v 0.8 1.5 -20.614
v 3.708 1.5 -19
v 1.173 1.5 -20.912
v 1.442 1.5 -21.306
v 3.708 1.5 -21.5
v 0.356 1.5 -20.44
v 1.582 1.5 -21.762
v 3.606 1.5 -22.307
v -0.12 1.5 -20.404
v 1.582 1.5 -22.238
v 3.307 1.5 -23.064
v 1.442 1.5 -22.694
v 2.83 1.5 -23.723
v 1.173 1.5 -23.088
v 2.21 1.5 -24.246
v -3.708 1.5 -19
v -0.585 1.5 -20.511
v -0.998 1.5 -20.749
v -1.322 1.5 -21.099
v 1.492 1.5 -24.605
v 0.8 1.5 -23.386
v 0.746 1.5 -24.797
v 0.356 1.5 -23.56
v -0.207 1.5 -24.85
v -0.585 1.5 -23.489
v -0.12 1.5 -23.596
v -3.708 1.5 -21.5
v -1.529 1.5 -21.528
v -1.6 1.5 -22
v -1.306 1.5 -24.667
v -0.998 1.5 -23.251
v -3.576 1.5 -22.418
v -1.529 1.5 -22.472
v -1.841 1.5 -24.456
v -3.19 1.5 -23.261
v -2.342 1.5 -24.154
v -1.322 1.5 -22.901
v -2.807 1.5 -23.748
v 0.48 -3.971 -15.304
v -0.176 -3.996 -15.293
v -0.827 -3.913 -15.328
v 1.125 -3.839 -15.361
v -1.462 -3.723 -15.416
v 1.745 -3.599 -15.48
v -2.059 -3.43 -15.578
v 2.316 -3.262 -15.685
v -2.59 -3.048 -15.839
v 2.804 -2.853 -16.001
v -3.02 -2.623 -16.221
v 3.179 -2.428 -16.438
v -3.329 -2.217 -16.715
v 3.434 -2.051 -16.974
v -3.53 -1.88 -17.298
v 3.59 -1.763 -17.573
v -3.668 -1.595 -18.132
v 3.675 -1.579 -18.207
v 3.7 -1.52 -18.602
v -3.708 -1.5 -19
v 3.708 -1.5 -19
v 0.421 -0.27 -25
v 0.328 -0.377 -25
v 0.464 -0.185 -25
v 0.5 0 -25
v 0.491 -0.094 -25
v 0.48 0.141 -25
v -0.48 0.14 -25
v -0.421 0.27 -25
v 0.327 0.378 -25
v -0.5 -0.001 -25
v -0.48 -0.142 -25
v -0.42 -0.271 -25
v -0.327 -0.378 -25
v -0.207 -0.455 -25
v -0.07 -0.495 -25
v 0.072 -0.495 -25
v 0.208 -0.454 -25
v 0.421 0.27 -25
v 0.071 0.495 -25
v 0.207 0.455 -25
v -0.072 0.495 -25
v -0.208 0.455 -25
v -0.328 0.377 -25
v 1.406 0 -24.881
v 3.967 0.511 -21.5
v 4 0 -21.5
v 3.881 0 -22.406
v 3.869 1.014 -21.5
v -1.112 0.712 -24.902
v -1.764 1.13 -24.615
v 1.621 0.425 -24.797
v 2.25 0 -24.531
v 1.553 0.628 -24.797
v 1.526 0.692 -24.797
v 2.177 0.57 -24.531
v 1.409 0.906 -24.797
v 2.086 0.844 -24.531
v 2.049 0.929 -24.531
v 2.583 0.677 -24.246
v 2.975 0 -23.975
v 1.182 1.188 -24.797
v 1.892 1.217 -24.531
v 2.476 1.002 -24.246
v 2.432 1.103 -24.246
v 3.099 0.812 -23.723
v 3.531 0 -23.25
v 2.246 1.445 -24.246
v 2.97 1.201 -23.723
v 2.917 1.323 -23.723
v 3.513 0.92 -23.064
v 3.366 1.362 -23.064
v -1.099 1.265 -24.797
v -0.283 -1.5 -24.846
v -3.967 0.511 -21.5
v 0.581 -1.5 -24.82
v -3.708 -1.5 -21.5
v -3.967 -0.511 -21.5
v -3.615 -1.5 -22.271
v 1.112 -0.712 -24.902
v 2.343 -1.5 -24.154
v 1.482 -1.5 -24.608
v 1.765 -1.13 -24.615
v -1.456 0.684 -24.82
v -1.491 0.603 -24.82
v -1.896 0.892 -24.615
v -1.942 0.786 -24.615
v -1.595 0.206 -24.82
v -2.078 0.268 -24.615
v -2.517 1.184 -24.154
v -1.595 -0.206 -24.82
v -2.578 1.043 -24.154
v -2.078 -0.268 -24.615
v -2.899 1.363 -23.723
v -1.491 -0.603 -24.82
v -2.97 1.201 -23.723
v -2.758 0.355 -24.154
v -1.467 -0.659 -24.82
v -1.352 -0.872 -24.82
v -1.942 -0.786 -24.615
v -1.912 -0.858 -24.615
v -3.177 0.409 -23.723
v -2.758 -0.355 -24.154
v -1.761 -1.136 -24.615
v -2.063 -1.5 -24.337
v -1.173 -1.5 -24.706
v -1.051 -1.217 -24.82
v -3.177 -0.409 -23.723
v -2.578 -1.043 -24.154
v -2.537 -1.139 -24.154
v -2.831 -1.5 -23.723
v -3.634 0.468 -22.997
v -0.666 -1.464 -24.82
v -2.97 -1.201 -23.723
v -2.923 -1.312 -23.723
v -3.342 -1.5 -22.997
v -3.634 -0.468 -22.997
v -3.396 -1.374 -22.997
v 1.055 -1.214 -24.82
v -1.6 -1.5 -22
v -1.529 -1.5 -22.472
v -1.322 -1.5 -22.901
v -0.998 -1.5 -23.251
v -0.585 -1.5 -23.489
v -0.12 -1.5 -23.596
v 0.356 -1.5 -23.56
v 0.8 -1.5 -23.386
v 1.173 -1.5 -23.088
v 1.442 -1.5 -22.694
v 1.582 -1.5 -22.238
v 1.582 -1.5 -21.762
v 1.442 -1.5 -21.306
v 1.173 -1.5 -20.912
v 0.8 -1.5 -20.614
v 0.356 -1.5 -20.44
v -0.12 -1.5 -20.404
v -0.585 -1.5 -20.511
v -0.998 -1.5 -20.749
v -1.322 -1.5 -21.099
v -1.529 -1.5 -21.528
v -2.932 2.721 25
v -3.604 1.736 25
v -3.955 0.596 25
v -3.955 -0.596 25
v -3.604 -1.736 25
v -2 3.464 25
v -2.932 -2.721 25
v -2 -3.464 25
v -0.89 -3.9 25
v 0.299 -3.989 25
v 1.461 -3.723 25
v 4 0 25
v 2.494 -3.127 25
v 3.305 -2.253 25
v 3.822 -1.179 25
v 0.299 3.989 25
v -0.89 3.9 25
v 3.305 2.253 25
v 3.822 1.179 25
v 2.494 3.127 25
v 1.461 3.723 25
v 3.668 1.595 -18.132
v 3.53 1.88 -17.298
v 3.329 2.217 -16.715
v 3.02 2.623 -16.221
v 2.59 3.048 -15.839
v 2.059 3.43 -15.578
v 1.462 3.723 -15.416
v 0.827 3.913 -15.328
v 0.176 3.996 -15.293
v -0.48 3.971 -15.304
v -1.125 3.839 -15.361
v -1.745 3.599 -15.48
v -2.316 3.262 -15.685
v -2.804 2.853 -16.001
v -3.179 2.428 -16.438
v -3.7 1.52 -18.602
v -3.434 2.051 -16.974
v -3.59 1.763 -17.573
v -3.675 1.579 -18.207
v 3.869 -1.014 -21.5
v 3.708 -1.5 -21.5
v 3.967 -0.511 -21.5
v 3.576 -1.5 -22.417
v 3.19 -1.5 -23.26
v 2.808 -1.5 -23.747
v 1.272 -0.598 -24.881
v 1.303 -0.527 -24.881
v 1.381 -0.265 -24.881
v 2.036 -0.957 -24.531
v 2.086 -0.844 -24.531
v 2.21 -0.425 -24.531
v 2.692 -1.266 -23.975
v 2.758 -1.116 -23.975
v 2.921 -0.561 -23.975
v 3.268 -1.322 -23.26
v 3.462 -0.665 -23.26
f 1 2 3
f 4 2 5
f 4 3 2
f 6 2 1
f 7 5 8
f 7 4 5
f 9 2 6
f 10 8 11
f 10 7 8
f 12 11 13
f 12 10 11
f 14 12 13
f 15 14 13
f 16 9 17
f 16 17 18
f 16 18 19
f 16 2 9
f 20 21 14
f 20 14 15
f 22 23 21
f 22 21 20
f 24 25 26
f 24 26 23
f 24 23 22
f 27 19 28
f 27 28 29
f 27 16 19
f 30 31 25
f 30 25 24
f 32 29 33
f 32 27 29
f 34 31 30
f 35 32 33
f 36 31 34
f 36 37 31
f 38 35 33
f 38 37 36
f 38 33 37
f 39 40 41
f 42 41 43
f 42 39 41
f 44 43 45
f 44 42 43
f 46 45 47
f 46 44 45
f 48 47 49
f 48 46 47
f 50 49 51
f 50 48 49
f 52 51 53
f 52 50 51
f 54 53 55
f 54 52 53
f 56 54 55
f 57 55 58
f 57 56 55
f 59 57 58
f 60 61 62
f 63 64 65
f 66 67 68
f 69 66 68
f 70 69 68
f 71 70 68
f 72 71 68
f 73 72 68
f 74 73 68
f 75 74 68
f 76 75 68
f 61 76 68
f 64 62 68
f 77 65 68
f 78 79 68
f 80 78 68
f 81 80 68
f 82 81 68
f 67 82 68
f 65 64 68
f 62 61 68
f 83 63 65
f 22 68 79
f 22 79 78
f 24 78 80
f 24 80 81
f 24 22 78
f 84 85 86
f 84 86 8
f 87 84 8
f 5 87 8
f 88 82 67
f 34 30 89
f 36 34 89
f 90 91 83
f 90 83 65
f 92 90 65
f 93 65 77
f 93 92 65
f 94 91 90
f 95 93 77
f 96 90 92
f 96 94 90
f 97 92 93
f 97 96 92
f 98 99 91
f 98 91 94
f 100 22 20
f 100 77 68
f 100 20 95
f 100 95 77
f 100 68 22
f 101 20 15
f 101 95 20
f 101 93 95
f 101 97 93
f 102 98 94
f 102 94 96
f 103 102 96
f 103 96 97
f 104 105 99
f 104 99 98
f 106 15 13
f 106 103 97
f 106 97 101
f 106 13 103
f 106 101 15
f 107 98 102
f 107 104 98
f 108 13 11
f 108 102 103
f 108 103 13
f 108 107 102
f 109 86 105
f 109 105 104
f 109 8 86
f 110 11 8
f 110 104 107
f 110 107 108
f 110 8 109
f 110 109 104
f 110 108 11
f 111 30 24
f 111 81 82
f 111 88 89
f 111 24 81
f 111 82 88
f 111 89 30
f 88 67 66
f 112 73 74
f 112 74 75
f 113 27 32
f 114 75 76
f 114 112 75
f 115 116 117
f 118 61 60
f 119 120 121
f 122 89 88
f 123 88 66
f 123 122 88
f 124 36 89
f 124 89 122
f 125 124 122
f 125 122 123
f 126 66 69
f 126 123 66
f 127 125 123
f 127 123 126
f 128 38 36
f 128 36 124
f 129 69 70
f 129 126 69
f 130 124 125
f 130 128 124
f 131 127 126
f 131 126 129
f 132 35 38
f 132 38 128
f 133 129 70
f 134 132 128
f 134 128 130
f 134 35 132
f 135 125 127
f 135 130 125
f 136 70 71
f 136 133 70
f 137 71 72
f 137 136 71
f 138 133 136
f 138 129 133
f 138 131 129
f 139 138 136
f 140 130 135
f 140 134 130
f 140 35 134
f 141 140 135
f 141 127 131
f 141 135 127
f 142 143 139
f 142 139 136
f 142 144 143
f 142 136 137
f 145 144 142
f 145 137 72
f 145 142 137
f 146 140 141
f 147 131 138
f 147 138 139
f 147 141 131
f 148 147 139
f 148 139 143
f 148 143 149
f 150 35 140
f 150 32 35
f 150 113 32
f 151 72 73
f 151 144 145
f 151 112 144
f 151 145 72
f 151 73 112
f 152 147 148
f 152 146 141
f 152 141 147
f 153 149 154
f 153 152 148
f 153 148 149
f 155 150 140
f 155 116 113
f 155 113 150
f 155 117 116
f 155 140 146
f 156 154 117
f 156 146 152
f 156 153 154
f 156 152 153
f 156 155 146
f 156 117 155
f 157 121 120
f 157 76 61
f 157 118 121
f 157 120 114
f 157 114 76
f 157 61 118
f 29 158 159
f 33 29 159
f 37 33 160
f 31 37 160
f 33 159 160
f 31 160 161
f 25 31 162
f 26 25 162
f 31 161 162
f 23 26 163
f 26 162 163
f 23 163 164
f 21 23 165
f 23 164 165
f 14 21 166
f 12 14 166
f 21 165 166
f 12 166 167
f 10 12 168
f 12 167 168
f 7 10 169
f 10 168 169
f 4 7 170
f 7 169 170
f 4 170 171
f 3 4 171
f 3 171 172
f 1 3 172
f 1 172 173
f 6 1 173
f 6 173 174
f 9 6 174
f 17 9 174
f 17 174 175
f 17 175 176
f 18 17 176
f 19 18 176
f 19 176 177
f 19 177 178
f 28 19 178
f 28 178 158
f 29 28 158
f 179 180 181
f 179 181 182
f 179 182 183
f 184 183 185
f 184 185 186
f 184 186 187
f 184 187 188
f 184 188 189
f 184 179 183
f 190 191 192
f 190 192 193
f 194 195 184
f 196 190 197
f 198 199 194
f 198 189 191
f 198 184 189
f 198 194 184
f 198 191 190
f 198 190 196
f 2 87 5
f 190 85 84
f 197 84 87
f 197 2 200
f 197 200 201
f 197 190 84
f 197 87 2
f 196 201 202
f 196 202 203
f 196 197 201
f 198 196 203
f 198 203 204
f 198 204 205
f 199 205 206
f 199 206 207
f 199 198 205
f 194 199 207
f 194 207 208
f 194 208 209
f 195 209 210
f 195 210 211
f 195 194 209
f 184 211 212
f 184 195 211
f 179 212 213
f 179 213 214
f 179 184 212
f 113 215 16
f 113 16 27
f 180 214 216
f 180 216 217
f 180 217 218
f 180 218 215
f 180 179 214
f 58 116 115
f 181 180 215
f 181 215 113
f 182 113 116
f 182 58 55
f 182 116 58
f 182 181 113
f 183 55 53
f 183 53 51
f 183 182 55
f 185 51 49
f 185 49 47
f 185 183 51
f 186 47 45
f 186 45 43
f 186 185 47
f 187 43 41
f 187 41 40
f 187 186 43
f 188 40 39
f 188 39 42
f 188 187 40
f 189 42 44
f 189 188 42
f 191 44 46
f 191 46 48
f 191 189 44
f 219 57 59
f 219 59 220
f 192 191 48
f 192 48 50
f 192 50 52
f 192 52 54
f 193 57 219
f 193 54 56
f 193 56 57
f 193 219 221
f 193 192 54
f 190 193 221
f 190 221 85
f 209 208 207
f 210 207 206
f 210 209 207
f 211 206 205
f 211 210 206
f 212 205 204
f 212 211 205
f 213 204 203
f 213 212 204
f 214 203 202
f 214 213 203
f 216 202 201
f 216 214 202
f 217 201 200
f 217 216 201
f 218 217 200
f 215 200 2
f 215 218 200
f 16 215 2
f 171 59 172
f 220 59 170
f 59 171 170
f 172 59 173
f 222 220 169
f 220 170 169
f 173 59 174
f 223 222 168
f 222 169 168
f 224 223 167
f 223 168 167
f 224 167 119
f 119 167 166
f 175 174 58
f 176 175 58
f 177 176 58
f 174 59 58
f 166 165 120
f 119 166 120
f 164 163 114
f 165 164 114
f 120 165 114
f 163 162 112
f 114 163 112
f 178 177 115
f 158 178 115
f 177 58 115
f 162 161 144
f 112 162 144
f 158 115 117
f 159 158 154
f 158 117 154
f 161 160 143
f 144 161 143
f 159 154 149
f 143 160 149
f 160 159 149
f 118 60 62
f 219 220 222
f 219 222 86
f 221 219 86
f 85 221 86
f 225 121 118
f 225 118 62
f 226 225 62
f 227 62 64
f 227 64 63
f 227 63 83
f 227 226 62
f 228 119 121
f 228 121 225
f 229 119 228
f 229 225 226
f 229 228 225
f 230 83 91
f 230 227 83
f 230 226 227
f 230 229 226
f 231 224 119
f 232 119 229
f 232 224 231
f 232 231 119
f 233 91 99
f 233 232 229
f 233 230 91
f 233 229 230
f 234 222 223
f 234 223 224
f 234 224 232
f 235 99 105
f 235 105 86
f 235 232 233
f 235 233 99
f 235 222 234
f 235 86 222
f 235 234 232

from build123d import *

# Parameters (mm, degrees)
SKETCH1_R               = 4
BOSS_EXTRUDE1_DEPTH     = 25
CUT_EXTRUDE1_DEPTH      = 26.632011236
CUT_EXTRUDE1_DEPTH_BACK = 26.632011236
SKETCH2_W               = 10
SKETCH2_H               = 2.5
FILLET1_R               = 4
M3_CLEARANCE_HOLE1_D    = 3.2
FILLET2_R               = 3.5


with BuildPart() as part:
    # Sketch1 → Boss-Extrude1 (new, symmetric)
    with BuildSketch(Plane.XY):
        Circle(SKETCH1_R)
    extrude(amount=BOSS_EXTRUDE1_DEPTH, both=True)

    # Sketch2 → Cut-Extrude1 (cut, two sides: drawn at the far end of the back side and taken through both)
    with BuildSketch(Plane(origin=(0, 0, 0), x_dir=(0, 0, -1), z_dir=(1, 0, 0)).offset(-CUT_EXTRUDE1_DEPTH_BACK)):
        with Locations((20, -2.75)):
            Rectangle(SKETCH2_W, SKETCH2_H)
        with Locations((20, 2.75)):
            Rectangle(SKETCH2_W, SKETCH2_H)
    extrude(amount=CUT_EXTRUDE1_DEPTH + CUT_EXTRUDE1_DEPTH_BACK, mode=Mode.SUBTRACT)

    # Fillet1
    # the kernel refuses this fillet: 4 mm, written as the material it adds along each edge
    with BuildSketch(Plane(origin=(13.708099244, -1.5, -15), x_dir=(0, -1, 0), z_dir=(-1, 0, 0))) as fillet1_piece_1_section:
        with BuildLine():
            CenterArc((FILLET1_R, -FILLET1_R), FILLET1_R, 90, 90)
            Line((0, -FILLET1_R), (0, 0))
            Line((0, 0), (FILLET1_R, 0))
        make_face()
    fillet1_piece_1 = extrude(amount=27.416198487, mode=Mode.PRIVATE)
    fillet1_piece_1 = fillet1_piece_1 & Plane(origin=(0, 0, -16.053491098), x_dir=(1, 0, 0), z_dir=(0, 0, 1)) * Cylinder(4, 71, mode=Mode.PRIVATE)
    add(fillet1_piece_1)
    with BuildSketch(Plane(origin=(-13.708099244, 1.5, -15), x_dir=(0, 1, 0), z_dir=(1, 0, 0))) as fillet1_piece_2_section:
        with BuildLine():
            CenterArc((FILLET1_R, -FILLET1_R), FILLET1_R, 90, 90)
            Line((0, -FILLET1_R), (0, 0))
            Line((0, 0), (FILLET1_R, 0))
        make_face()
    fillet1_piece_2 = extrude(amount=27.416198487, mode=Mode.PRIVATE)
    fillet1_piece_2 = fillet1_piece_2 & Plane(origin=(0, 0, -16.053491097), x_dir=(1, 0, 0), z_dir=(0, 0, 1)) * Cylinder(4, 71, mode=Mode.PRIVATE)
    add(fillet1_piece_2)

    # M3 Clearance Hole1 (through all)
    with Locations(Plane(origin=(0, 1.5, 0), x_dir=(1, 0, 0), z_dir=(0, 1, 0))):
        with Locations((0, 22)):
            Hole(M3_CLEARANCE_HOLE1_D / 2)

    # Fillet2
    # the kernel refuses this fillet: 3.5 mm, written as the material it takes off along each edge
    with BuildSketch(Plane(origin=(0, 0, -25), x_dir=(1, 0, 0), z_dir=(0, -1, 0))) as fillet2_piece_1:
        with BuildLine():
            CenterArc((4 - FILLET2_R, FILLET2_R), FILLET2_R, 270, 90)
            Line((4 - FILLET2_R, 0), (4, 0))
            Line((4, 0), (4, FILLET2_R))
        make_face()
    revolve(axis=Axis((0, 0, -25), (0, 0, 1)), revolution_arc=147.36184482, mode=Mode.SUBTRACT)
    with BuildSketch(Plane(origin=(0, 0, -25), x_dir=(0.842178541761355, 0.5391987609376692, 0), z_dir=(0.5391987609376692, -0.842178541761355, 0))) as fillet2_piece_2:
        with BuildLine():
            CenterArc((4 - FILLET2_R, FILLET2_R), FILLET2_R, 270, 90)
            Line((4 - FILLET2_R, 0), (4, 0))
            Line((4, 0), (4, FILLET2_R))
        make_face()
    revolve(axis=Axis((0, 0, -25), (0, 0, 1)), revolution_arc=294.74177665, mode=Mode.SUBTRACT)
    with BuildSketch(Plane(origin=(0, 0, -25), x_dir=(-0.8420934247140166, -0.5393316827828853, 0), z_dir=(-0.5393316827828853, 0.8420934247140166, 0))) as fillet2_piece_3:
        with BuildLine():
            CenterArc((4 - FILLET2_R, FILLET2_R), FILLET2_R, 270, 90)
            Line((4 - FILLET2_R, 0), (4, 0))
            Line((4, 0), (4, FILLET2_R))
        make_face()
    revolve(axis=Axis((0, 0, -25), (0, 0, 1)), revolution_arc=147.36184482, mode=Mode.SUBTRACT)


solid = part.part
